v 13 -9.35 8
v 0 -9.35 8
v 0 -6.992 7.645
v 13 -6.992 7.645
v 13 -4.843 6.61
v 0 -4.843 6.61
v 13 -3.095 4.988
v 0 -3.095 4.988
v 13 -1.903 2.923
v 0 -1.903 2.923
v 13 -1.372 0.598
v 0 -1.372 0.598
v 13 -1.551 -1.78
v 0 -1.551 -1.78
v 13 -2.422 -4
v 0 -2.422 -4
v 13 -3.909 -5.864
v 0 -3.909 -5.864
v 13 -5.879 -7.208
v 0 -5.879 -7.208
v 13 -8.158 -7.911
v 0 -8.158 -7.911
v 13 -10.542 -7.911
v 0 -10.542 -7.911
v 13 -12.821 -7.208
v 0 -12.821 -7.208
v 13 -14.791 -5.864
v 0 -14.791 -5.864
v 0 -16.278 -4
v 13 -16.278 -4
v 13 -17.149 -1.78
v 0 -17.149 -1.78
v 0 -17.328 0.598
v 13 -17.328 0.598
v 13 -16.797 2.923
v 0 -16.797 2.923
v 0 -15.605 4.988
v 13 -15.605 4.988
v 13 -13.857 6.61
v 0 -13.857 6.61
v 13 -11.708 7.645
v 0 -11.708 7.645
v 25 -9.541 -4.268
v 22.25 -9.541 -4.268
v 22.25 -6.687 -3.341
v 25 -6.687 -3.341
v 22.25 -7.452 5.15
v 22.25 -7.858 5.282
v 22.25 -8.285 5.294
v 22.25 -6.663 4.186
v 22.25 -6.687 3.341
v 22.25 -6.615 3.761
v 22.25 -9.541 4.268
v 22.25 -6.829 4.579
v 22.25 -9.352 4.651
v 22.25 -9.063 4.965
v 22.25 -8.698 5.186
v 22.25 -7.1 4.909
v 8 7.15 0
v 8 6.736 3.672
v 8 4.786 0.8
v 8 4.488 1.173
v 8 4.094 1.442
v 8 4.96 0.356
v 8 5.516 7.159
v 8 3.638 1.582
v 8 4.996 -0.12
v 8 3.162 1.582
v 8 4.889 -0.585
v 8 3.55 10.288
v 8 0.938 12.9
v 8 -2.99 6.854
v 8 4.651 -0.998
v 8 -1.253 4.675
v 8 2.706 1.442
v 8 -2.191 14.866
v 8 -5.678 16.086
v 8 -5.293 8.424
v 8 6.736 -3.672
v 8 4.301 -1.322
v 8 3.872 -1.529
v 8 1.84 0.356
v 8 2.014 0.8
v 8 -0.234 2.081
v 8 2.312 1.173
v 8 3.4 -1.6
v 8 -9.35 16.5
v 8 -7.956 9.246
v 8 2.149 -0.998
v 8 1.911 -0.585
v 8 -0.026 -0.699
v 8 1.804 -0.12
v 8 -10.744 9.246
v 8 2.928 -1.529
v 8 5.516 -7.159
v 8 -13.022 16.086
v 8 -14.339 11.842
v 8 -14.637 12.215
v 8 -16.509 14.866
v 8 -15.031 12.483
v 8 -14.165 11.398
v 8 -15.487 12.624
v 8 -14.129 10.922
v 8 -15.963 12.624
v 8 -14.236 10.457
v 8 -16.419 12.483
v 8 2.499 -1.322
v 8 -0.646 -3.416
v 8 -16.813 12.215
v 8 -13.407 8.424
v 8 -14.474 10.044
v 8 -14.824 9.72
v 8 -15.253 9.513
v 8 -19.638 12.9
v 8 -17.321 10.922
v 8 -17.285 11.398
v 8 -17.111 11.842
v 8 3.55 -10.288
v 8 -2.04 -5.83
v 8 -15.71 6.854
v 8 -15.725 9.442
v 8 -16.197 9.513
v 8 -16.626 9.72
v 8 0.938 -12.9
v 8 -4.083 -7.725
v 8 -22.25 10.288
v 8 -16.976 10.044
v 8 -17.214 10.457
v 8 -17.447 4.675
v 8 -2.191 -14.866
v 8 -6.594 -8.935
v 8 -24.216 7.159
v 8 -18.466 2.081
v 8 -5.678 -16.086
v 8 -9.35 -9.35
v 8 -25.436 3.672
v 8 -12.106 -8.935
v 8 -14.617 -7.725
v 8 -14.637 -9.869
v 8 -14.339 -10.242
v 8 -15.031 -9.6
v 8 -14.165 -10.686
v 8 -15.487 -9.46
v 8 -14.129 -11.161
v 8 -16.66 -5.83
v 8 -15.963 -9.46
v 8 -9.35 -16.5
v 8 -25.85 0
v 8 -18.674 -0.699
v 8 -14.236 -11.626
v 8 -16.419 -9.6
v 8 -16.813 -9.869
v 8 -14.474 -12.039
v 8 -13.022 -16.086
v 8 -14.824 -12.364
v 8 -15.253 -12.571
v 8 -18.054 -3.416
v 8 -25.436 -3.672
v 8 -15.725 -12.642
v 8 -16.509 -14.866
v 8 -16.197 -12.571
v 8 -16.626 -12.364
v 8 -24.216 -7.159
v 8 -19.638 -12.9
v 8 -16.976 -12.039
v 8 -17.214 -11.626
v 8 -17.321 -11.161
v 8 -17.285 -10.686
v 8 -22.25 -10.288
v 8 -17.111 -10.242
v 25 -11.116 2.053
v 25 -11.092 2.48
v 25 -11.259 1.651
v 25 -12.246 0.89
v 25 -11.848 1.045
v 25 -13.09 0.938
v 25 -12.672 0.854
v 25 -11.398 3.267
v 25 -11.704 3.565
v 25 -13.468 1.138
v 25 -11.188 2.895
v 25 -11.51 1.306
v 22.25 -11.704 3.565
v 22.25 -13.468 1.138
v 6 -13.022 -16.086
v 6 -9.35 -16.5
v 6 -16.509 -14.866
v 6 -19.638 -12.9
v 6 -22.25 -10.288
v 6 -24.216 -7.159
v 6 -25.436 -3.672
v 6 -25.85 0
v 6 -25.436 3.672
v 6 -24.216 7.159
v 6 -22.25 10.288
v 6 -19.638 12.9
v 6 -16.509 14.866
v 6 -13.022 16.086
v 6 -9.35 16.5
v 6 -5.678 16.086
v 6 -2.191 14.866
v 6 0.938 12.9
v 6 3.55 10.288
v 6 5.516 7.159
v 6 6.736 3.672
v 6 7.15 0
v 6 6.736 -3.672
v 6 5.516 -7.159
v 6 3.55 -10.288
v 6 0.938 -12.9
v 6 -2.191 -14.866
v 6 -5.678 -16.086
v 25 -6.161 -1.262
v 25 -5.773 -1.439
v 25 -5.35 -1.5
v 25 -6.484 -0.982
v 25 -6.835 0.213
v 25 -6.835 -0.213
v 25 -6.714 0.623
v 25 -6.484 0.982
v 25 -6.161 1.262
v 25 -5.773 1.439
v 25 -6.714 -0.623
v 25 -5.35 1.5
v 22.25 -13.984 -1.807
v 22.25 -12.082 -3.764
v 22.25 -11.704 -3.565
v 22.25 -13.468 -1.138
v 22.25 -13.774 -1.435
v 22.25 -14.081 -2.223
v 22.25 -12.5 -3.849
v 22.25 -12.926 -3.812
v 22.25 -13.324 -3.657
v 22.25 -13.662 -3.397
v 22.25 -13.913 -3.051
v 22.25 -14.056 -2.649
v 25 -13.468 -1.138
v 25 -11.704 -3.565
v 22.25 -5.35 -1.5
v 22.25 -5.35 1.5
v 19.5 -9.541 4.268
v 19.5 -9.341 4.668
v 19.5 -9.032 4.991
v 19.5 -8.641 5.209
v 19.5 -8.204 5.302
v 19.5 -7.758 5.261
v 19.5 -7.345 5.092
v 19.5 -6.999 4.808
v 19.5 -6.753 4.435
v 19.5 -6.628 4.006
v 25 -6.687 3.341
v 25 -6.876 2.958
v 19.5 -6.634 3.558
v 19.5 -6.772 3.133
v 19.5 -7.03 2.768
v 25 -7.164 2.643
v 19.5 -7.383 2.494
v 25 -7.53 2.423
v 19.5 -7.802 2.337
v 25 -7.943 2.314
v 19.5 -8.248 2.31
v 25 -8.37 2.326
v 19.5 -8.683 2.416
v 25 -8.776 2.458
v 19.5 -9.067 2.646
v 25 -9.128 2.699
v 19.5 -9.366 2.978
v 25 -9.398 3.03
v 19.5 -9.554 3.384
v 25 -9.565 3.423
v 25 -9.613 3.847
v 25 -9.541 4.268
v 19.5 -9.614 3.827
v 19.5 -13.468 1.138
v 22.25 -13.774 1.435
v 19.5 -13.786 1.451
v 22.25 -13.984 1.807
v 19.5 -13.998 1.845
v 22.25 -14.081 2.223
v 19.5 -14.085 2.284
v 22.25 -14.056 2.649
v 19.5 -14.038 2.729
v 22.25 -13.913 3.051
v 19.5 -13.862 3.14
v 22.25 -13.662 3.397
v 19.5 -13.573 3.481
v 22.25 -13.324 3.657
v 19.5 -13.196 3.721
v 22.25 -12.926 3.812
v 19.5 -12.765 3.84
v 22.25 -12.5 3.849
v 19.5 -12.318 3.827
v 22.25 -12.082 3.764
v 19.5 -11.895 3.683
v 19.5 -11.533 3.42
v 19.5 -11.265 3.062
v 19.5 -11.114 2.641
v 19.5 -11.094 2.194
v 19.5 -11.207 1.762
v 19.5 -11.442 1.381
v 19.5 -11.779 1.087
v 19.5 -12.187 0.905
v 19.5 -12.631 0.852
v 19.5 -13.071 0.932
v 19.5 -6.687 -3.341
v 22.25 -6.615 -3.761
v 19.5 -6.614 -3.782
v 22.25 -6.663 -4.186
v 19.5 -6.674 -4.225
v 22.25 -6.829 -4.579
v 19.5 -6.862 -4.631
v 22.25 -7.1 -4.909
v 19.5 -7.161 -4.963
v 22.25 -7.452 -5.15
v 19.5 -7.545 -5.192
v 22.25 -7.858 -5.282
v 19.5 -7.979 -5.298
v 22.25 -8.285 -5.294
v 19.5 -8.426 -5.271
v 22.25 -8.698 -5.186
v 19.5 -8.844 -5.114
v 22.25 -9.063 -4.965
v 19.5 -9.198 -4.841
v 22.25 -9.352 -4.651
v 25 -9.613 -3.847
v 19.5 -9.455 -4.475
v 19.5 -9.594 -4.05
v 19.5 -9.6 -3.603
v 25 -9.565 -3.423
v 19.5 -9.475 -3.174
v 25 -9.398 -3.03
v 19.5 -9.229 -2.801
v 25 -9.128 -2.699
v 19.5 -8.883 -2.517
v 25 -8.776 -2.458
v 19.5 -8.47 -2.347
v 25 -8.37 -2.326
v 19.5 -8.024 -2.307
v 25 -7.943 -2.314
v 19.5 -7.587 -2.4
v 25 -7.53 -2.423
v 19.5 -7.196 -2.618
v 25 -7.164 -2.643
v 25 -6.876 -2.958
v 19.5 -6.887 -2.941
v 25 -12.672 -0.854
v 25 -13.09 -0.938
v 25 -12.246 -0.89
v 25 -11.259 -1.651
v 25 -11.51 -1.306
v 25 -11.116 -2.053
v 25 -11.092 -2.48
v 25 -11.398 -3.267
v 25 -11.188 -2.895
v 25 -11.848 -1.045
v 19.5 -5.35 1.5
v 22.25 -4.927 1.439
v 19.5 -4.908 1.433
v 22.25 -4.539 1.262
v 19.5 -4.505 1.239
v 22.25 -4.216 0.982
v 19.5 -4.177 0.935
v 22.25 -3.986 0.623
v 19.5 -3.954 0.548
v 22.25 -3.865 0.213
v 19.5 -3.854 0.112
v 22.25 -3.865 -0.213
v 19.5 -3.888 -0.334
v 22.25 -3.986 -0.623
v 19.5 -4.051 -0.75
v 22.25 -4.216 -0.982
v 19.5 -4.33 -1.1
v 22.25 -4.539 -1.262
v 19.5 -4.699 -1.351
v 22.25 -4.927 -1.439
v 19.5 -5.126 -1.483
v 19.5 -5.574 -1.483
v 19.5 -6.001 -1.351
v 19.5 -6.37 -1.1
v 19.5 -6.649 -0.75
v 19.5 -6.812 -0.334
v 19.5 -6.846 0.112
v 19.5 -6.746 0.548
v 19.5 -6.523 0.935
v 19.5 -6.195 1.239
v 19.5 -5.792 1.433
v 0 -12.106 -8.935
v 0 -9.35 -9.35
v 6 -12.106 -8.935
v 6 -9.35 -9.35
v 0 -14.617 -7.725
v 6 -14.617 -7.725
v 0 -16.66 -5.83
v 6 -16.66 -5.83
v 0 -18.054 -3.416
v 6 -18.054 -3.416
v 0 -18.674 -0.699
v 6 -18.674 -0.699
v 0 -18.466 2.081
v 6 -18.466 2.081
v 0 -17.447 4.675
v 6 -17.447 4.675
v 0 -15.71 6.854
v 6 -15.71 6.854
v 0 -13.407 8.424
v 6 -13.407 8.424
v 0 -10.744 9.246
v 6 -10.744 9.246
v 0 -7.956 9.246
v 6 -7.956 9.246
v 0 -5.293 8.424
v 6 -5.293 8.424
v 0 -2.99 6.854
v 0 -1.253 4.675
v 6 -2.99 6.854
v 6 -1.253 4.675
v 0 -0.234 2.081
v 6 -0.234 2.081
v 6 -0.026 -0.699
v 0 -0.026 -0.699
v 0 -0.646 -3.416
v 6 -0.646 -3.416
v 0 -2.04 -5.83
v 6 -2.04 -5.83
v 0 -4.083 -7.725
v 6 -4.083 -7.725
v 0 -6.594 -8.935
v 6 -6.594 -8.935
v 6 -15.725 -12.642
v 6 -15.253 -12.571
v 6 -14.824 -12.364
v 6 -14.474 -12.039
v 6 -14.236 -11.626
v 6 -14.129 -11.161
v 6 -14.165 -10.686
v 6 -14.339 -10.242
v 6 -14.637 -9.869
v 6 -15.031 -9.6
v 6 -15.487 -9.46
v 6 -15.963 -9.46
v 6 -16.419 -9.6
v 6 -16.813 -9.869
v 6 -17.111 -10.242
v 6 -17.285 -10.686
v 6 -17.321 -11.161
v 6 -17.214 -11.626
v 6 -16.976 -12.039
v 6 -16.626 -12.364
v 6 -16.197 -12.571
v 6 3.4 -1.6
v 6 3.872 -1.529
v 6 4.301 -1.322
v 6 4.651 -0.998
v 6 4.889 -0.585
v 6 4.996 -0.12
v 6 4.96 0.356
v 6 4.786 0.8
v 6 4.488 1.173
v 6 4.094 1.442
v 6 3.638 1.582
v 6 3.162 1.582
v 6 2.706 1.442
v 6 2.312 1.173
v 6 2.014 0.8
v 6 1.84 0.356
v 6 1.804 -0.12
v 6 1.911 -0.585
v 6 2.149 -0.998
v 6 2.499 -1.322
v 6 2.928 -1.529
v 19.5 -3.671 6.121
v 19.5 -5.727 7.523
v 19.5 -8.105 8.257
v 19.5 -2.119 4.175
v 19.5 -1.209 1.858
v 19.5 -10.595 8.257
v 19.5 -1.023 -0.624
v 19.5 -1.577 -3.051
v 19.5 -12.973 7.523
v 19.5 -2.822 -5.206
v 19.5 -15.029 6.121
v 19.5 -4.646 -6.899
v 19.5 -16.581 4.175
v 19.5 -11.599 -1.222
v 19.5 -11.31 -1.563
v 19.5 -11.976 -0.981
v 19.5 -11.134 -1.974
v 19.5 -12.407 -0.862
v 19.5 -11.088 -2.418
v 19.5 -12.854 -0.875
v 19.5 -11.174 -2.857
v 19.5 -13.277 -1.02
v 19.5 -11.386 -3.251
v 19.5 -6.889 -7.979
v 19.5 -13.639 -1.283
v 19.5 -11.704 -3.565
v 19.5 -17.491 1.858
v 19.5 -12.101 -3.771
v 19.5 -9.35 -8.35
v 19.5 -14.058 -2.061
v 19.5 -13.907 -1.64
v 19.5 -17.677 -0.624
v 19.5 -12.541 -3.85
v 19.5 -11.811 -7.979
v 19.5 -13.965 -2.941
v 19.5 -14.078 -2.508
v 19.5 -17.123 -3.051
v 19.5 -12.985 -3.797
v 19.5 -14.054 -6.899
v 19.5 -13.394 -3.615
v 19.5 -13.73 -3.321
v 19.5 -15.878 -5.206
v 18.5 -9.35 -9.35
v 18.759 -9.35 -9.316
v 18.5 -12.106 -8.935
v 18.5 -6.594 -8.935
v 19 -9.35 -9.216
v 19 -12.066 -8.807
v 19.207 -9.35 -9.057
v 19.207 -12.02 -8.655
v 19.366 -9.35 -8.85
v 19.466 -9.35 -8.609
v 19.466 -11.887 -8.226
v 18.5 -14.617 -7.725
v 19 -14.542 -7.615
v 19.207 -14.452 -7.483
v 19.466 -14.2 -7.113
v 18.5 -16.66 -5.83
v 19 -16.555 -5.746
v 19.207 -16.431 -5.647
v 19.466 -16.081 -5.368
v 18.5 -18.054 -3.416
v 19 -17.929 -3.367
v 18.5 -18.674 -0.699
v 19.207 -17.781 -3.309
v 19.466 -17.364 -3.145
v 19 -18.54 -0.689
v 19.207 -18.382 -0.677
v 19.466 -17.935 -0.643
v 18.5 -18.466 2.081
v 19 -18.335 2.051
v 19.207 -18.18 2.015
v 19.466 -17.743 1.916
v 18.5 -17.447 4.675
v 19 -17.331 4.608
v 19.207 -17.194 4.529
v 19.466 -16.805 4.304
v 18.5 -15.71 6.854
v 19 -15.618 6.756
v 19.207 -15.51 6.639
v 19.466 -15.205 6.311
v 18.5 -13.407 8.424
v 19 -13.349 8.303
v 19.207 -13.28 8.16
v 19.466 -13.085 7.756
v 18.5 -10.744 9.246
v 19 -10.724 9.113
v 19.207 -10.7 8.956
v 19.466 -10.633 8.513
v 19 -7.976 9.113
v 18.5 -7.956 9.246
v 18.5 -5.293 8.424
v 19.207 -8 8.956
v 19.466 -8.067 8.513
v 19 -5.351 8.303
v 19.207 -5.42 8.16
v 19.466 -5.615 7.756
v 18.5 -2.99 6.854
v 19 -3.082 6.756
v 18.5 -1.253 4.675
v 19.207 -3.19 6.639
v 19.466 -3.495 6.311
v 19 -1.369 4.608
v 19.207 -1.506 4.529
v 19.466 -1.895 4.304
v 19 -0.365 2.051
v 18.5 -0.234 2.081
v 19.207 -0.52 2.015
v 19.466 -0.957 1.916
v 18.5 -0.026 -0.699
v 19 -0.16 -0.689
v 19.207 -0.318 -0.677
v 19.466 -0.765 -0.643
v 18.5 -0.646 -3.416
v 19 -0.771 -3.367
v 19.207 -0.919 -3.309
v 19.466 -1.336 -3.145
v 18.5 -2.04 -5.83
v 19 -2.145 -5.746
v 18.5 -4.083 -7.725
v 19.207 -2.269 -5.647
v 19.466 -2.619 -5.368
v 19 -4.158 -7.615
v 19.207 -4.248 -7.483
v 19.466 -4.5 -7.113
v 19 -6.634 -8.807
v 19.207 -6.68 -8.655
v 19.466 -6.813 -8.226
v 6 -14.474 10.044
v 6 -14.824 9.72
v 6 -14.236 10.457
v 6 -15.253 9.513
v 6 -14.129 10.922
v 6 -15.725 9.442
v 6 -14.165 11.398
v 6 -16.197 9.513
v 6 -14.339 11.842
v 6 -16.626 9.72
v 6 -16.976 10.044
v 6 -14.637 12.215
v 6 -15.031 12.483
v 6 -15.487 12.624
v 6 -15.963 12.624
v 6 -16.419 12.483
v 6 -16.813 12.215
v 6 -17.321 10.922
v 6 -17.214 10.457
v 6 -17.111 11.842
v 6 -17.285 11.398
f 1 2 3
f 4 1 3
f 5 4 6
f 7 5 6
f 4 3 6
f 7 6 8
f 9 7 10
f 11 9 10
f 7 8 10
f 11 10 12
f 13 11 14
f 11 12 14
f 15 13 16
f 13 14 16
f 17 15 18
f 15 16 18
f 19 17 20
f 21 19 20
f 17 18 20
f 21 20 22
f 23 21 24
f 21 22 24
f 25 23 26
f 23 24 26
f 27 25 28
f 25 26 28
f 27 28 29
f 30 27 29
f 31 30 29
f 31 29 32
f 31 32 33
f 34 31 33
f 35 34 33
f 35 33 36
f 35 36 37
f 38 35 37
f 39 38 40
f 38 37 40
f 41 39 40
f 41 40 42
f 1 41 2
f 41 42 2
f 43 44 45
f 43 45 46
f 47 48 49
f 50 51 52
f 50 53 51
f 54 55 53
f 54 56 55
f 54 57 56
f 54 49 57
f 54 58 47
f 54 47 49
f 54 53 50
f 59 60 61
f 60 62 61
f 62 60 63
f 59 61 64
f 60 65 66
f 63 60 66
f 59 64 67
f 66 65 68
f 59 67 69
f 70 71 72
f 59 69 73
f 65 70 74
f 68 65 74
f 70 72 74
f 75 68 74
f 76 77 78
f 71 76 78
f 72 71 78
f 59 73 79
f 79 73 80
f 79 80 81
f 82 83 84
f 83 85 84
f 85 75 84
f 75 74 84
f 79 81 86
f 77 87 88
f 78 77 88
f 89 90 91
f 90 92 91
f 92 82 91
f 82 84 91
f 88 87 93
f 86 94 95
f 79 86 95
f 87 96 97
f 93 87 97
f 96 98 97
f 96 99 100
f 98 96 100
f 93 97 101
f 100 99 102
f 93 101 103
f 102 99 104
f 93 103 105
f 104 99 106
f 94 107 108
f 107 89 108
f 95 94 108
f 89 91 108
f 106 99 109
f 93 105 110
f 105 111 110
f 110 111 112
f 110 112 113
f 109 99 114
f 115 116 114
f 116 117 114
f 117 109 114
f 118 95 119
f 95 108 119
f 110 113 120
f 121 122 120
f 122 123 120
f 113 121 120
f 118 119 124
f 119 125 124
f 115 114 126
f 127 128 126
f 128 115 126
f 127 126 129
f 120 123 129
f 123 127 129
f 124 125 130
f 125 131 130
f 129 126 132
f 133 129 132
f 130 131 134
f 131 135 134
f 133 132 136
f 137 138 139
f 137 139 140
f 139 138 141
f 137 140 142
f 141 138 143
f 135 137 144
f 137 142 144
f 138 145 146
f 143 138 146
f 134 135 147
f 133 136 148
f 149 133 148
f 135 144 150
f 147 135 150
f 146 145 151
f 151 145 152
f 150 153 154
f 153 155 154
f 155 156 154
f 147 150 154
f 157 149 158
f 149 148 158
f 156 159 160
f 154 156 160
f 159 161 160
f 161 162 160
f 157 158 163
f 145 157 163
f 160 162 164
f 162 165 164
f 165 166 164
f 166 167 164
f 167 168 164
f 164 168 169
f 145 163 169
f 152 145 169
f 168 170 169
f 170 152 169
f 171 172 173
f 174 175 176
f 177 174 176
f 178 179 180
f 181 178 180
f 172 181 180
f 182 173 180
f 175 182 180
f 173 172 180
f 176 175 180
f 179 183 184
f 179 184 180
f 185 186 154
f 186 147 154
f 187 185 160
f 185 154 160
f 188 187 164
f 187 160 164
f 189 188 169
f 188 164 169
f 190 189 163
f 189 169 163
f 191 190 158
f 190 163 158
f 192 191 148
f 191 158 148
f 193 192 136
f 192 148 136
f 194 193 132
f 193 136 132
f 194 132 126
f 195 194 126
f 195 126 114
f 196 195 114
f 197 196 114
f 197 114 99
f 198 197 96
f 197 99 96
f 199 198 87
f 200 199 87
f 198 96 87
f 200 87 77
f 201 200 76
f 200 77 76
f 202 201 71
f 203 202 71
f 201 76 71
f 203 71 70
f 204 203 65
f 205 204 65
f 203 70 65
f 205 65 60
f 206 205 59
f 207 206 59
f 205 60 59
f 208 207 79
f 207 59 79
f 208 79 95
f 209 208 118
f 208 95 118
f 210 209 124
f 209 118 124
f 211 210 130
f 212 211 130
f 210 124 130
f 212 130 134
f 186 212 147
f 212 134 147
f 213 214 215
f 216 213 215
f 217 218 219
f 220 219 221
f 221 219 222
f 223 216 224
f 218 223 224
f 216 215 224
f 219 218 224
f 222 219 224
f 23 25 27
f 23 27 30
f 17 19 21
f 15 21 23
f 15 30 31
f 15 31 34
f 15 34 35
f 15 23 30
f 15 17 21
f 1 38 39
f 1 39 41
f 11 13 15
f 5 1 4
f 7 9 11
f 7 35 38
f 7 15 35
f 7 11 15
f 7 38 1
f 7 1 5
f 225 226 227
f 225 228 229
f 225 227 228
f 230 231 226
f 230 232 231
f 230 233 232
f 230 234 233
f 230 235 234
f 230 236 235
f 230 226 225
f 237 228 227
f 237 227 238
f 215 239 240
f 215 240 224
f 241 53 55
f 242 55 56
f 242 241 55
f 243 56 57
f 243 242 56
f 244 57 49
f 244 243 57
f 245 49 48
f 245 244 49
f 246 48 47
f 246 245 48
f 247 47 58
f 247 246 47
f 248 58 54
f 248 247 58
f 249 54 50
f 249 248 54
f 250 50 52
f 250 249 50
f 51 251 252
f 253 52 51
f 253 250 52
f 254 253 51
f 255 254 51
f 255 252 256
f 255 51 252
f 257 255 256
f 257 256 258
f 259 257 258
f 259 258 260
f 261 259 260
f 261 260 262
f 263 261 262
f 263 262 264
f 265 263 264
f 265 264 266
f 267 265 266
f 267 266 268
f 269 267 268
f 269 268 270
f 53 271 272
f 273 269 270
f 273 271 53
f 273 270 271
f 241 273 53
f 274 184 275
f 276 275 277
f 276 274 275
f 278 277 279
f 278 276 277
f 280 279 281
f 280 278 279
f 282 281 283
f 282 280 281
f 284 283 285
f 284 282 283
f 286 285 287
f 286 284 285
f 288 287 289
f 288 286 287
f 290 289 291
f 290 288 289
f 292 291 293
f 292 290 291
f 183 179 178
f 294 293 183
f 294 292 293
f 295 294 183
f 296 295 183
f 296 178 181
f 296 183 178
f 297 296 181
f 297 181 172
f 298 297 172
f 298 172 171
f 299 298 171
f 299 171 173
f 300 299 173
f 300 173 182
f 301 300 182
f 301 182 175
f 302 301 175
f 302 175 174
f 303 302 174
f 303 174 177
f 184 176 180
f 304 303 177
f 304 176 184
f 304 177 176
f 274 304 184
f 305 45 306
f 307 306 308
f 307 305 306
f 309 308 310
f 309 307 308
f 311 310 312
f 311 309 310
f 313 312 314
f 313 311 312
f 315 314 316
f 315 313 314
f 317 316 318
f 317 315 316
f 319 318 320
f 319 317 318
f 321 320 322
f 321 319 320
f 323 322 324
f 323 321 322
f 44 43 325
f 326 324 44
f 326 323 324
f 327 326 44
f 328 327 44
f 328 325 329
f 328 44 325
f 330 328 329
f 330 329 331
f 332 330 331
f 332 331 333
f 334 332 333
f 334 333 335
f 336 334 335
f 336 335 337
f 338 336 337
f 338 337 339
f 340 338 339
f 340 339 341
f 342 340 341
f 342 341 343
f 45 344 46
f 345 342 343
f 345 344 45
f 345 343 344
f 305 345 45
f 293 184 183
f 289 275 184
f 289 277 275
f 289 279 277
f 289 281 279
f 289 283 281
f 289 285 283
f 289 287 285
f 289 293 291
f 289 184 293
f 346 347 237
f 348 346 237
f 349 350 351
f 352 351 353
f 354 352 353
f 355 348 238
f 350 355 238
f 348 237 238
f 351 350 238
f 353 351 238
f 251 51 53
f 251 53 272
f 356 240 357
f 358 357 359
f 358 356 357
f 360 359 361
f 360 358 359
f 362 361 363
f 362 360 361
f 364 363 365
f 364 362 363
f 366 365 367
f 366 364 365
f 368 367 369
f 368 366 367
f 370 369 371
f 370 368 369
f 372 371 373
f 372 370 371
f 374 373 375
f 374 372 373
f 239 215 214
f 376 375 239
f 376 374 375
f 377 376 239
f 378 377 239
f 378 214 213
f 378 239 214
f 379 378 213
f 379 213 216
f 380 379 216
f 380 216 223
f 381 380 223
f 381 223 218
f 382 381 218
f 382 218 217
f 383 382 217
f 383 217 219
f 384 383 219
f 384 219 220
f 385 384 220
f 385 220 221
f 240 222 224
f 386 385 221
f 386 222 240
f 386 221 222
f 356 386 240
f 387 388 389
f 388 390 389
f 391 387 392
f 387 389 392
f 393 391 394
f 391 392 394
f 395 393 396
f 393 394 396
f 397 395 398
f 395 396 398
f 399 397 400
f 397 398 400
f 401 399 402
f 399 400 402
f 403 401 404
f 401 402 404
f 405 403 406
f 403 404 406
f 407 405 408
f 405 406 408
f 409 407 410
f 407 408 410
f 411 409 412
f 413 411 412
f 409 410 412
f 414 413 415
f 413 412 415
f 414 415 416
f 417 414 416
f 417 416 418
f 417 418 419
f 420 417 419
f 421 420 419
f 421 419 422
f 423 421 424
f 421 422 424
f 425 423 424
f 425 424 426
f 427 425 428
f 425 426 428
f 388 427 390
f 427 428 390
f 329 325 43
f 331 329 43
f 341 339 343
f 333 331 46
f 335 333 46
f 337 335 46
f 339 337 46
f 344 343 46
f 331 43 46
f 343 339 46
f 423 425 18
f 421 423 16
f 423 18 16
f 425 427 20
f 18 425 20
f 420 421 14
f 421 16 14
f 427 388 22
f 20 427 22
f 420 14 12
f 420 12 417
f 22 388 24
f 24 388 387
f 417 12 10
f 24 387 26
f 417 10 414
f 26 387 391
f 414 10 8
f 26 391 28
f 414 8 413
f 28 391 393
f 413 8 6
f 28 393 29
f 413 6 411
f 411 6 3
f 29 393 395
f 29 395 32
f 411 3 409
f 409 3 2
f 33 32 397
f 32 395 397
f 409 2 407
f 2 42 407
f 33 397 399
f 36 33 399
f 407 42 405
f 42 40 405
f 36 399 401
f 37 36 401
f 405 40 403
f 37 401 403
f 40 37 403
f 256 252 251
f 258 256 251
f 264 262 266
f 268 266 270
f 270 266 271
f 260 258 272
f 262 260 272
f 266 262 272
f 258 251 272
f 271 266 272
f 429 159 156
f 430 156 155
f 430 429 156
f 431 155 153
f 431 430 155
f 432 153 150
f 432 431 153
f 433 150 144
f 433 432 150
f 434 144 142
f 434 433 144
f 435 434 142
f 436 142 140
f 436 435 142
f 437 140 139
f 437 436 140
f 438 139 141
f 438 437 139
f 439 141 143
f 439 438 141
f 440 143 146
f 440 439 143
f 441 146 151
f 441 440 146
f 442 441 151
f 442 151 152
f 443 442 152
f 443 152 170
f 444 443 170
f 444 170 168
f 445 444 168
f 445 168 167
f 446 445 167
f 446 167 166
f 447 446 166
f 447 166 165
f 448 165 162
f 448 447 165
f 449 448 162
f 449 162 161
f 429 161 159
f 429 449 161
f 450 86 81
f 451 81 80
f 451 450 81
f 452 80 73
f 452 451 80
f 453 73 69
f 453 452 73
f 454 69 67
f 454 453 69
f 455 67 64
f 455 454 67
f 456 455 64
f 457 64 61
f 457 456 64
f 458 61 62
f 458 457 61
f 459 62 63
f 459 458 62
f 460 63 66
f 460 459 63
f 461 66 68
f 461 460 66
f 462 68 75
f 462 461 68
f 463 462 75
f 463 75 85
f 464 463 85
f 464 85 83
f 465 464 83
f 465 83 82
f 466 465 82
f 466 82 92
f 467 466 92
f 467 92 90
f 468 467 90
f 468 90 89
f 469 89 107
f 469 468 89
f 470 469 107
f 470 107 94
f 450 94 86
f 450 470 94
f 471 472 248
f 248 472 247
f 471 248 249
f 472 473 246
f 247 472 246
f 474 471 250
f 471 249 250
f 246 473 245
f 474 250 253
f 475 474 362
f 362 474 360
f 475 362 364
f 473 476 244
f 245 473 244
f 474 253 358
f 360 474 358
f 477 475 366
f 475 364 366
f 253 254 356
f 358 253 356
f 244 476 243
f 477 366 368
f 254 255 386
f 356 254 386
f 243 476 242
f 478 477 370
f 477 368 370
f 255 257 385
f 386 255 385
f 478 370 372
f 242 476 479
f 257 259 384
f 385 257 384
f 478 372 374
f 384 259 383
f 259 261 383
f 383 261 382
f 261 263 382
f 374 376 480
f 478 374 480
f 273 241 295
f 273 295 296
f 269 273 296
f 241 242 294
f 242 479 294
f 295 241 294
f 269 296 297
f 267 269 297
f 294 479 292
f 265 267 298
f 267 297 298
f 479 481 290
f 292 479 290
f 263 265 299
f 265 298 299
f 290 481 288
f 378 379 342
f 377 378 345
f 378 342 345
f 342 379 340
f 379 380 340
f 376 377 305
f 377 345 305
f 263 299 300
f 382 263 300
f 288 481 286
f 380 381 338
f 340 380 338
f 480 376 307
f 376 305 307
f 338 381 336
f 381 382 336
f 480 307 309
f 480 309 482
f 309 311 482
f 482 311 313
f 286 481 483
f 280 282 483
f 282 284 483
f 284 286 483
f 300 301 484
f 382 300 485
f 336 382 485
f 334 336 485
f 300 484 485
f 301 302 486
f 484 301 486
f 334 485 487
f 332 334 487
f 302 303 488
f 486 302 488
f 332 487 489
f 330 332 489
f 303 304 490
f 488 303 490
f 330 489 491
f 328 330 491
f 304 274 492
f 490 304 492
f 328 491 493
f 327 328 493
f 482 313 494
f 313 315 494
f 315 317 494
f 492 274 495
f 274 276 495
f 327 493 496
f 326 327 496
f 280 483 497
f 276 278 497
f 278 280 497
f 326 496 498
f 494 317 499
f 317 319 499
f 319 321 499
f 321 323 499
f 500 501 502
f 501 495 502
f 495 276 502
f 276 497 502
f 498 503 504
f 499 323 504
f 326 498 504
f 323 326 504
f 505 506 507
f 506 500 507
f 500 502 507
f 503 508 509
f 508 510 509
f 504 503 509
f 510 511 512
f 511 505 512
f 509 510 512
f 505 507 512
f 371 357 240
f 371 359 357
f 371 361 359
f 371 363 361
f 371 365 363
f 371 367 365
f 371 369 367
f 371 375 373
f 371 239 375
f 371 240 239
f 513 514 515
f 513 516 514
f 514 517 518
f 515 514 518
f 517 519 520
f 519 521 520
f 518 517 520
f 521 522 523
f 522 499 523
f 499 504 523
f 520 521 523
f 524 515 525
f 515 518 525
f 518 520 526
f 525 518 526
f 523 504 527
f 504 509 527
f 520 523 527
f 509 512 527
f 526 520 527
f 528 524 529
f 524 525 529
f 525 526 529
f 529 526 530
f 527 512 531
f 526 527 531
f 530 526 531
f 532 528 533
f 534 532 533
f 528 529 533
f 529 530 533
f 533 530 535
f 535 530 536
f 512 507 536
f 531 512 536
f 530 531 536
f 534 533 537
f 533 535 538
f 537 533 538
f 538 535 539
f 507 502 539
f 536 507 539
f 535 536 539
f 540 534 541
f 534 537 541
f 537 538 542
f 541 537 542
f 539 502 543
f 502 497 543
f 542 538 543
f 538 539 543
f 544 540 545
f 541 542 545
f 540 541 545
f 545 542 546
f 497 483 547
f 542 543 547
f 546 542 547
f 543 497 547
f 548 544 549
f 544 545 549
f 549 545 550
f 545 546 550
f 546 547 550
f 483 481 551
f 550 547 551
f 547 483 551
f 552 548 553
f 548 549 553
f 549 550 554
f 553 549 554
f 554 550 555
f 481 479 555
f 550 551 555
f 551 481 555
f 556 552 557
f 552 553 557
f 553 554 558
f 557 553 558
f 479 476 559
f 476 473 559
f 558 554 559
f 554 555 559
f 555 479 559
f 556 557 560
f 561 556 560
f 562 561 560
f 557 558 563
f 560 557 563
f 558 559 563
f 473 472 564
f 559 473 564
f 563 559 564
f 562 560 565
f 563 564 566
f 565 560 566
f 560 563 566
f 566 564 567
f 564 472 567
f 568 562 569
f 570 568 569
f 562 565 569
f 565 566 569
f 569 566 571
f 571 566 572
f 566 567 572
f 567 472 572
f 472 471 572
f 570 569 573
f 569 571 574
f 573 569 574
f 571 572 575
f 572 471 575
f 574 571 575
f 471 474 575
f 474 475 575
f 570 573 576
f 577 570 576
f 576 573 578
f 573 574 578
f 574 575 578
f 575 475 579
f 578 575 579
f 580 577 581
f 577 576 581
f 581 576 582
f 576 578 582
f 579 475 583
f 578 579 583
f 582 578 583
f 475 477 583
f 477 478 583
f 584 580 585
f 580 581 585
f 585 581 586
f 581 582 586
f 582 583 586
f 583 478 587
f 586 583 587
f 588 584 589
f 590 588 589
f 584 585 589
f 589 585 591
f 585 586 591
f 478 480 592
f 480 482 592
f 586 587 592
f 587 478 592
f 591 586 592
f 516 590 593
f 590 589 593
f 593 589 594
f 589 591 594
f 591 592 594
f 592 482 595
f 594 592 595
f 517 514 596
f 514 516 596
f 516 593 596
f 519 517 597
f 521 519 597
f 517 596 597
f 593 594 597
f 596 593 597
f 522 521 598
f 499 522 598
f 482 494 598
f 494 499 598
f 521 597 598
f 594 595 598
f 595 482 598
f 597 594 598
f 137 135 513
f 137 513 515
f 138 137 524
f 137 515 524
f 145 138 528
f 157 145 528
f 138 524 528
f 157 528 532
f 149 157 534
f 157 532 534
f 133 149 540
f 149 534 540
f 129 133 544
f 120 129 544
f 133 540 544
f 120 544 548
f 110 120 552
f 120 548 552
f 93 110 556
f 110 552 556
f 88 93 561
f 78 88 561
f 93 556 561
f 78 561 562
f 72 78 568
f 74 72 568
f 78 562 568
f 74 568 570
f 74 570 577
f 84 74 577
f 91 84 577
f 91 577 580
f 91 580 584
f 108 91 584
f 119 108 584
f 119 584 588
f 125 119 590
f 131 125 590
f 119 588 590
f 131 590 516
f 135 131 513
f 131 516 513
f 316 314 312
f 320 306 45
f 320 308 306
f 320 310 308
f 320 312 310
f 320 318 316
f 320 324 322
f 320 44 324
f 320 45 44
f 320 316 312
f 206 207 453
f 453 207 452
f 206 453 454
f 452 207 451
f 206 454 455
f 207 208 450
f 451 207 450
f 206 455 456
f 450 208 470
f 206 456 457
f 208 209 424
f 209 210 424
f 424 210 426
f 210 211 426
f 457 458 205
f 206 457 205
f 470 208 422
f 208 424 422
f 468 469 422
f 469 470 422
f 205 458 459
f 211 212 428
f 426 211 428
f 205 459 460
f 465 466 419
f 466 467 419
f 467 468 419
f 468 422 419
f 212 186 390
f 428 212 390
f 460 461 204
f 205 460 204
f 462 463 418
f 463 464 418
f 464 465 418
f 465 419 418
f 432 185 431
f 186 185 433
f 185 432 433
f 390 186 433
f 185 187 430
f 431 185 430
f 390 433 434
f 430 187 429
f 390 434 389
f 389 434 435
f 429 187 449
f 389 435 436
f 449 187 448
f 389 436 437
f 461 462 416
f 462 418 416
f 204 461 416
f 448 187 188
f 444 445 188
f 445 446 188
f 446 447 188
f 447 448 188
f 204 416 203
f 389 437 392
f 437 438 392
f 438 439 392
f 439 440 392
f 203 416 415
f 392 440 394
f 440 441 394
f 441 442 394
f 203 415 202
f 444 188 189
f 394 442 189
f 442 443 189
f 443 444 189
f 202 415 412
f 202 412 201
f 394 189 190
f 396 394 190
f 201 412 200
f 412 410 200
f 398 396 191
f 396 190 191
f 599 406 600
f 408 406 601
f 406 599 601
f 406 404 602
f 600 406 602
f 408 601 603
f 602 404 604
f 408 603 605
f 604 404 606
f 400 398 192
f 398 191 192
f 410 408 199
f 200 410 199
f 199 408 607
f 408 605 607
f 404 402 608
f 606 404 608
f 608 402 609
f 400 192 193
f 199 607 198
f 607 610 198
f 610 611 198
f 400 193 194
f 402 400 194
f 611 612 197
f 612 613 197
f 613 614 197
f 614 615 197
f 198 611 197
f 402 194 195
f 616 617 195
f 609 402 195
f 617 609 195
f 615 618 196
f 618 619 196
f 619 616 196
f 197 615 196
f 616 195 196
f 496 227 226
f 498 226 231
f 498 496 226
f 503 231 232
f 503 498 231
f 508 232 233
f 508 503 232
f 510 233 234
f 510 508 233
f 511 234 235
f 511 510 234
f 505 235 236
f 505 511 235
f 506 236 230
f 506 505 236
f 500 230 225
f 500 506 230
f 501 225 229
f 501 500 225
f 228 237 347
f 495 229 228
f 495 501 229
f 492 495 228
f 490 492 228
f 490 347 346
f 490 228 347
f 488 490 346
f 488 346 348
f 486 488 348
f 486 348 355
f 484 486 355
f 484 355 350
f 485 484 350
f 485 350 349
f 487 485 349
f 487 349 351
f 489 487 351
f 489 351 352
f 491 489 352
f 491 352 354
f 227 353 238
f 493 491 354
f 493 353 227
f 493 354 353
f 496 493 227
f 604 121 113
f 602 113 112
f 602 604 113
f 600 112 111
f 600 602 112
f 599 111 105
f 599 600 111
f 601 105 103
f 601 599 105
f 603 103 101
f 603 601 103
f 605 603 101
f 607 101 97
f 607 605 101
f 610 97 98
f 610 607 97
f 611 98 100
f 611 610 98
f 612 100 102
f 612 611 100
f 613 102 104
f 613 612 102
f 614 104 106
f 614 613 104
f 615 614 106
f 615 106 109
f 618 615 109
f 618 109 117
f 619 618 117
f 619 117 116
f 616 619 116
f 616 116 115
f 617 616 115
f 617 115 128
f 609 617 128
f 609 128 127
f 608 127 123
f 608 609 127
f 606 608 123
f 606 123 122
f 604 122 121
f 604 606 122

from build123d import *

# Parameters (mm, degrees)
SKIZZE2_R                       = 1.5
AUFSATZ_LINEAR_AUSTRAGEN1_DEPTH = 5.5
SKIZZE3_W                       = 2.75
SKIZZE3_H                       = 3
SCHNITT_LINEAR_AUSTRAGEN1_DEPTH = 1.5
KREISMUSTER1_COUNT              = 5
SKIZZE4_R                       = 1.6
SCHNITT_LINEAR_AUSTRAGEN5_DEPTH = 37.075926877
SKIZZE5_R                       = 8
SCHNITT_LINEAR_AUSTRAGEN6_DEPTH = 13
VERRUNDUNG1_R                   = 1


with BuildPart() as part:
    # Skizze1 → Rotation1 (revolve)
    with BuildSketch(Plane.XY):
        Polygon((0, 0), (6, 0), (6, 7.15), (8, 7.15), (8, 0), (19.5, 0), (19.5, -9.35), (0, -9.35), align=None)
    revolve(axis=Axis((19.5, -9.35, 0), (-1, 0, 0)))

    # Skizze2 → Aufsatz-Linear austragen1 (add)
    with BuildSketch(Plane.ZY.offset(-19.5)):
        with Locations((0, -5.35)):
            Circle(SKIZZE2_R)
    aufsatz_linear_austragen1 = extrude(amount=-AUFSATZ_LINEAR_AUSTRAGEN1_DEPTH)

    # Skizze3 → Schnitt-Linear austragen1 (cut)
    with BuildSketch(Plane(origin=(0, -3.85, 0), x_dir=(1, 0, 0), z_dir=(0, 1, 0))):
        with Locations((23.625, 0)):
            Rectangle(SKIZZE3_W, SKIZZE3_H)
    schnitt_linear_austragen1 = extrude(amount=-SCHNITT_LINEAR_AUSTRAGEN1_DEPTH, mode=Mode.SUBTRACT)

    # Kreismuster1: Aufsatz-Linear austragen1, Schnitt-Linear austragen1 ×5 about axis
    kreismuster1_axis = Axis((19.5, -9.35, 0), (1, 0, 0))
    add([aufsatz_linear_austragen1.rotate(kreismuster1_axis, i * 360 / KREISMUSTER1_COUNT) for i in range(1, KREISMUSTER1_COUNT)])
    add([schnitt_linear_austragen1.rotate(kreismuster1_axis, i * 360 / KREISMUSTER1_COUNT) for i in range(1, KREISMUSTER1_COUNT)], mode=Mode.SUBTRACT)

    # Skizze4 → Schnitt-Linear austragen5 (cut, through all)
    with BuildSketch(Plane(origin=(6, 0, 0), x_dir=(0, 0, -1), z_dir=(1, 0, 0))):
        with Locations((0, 3.4)):
            Circle(SKIZZE4_R)
        with Locations((11.041823898, -15.725)):
            Circle(SKIZZE4_R)
        with Locations((-11.041823898, -15.725)):
            Circle(SKIZZE4_R)
    extrude(amount=SCHNITT_LINEAR_AUSTRAGEN5_DEPTH, mode=Mode.SUBTRACT)

    # Skizze5 → Schnitt-Linear austragen6 (cut)
    with BuildSketch(Plane.ZY):
        with Locations((0, -9.35)):
            Circle(SKIZZE5_R)
    extrude(amount=-SCHNITT_LINEAR_AUSTRAGEN6_DEPTH, mode=Mode.SUBTRACT)

    # Verrundung1
    verrundung1_edges = [part.edges().sort_by_distance(p)[0] for p in [
        (19.5, -18.7, 0),
    ]]
    fillet(verrundung1_edges, radius=VERRUNDUNG1_R)


solid = part.part
